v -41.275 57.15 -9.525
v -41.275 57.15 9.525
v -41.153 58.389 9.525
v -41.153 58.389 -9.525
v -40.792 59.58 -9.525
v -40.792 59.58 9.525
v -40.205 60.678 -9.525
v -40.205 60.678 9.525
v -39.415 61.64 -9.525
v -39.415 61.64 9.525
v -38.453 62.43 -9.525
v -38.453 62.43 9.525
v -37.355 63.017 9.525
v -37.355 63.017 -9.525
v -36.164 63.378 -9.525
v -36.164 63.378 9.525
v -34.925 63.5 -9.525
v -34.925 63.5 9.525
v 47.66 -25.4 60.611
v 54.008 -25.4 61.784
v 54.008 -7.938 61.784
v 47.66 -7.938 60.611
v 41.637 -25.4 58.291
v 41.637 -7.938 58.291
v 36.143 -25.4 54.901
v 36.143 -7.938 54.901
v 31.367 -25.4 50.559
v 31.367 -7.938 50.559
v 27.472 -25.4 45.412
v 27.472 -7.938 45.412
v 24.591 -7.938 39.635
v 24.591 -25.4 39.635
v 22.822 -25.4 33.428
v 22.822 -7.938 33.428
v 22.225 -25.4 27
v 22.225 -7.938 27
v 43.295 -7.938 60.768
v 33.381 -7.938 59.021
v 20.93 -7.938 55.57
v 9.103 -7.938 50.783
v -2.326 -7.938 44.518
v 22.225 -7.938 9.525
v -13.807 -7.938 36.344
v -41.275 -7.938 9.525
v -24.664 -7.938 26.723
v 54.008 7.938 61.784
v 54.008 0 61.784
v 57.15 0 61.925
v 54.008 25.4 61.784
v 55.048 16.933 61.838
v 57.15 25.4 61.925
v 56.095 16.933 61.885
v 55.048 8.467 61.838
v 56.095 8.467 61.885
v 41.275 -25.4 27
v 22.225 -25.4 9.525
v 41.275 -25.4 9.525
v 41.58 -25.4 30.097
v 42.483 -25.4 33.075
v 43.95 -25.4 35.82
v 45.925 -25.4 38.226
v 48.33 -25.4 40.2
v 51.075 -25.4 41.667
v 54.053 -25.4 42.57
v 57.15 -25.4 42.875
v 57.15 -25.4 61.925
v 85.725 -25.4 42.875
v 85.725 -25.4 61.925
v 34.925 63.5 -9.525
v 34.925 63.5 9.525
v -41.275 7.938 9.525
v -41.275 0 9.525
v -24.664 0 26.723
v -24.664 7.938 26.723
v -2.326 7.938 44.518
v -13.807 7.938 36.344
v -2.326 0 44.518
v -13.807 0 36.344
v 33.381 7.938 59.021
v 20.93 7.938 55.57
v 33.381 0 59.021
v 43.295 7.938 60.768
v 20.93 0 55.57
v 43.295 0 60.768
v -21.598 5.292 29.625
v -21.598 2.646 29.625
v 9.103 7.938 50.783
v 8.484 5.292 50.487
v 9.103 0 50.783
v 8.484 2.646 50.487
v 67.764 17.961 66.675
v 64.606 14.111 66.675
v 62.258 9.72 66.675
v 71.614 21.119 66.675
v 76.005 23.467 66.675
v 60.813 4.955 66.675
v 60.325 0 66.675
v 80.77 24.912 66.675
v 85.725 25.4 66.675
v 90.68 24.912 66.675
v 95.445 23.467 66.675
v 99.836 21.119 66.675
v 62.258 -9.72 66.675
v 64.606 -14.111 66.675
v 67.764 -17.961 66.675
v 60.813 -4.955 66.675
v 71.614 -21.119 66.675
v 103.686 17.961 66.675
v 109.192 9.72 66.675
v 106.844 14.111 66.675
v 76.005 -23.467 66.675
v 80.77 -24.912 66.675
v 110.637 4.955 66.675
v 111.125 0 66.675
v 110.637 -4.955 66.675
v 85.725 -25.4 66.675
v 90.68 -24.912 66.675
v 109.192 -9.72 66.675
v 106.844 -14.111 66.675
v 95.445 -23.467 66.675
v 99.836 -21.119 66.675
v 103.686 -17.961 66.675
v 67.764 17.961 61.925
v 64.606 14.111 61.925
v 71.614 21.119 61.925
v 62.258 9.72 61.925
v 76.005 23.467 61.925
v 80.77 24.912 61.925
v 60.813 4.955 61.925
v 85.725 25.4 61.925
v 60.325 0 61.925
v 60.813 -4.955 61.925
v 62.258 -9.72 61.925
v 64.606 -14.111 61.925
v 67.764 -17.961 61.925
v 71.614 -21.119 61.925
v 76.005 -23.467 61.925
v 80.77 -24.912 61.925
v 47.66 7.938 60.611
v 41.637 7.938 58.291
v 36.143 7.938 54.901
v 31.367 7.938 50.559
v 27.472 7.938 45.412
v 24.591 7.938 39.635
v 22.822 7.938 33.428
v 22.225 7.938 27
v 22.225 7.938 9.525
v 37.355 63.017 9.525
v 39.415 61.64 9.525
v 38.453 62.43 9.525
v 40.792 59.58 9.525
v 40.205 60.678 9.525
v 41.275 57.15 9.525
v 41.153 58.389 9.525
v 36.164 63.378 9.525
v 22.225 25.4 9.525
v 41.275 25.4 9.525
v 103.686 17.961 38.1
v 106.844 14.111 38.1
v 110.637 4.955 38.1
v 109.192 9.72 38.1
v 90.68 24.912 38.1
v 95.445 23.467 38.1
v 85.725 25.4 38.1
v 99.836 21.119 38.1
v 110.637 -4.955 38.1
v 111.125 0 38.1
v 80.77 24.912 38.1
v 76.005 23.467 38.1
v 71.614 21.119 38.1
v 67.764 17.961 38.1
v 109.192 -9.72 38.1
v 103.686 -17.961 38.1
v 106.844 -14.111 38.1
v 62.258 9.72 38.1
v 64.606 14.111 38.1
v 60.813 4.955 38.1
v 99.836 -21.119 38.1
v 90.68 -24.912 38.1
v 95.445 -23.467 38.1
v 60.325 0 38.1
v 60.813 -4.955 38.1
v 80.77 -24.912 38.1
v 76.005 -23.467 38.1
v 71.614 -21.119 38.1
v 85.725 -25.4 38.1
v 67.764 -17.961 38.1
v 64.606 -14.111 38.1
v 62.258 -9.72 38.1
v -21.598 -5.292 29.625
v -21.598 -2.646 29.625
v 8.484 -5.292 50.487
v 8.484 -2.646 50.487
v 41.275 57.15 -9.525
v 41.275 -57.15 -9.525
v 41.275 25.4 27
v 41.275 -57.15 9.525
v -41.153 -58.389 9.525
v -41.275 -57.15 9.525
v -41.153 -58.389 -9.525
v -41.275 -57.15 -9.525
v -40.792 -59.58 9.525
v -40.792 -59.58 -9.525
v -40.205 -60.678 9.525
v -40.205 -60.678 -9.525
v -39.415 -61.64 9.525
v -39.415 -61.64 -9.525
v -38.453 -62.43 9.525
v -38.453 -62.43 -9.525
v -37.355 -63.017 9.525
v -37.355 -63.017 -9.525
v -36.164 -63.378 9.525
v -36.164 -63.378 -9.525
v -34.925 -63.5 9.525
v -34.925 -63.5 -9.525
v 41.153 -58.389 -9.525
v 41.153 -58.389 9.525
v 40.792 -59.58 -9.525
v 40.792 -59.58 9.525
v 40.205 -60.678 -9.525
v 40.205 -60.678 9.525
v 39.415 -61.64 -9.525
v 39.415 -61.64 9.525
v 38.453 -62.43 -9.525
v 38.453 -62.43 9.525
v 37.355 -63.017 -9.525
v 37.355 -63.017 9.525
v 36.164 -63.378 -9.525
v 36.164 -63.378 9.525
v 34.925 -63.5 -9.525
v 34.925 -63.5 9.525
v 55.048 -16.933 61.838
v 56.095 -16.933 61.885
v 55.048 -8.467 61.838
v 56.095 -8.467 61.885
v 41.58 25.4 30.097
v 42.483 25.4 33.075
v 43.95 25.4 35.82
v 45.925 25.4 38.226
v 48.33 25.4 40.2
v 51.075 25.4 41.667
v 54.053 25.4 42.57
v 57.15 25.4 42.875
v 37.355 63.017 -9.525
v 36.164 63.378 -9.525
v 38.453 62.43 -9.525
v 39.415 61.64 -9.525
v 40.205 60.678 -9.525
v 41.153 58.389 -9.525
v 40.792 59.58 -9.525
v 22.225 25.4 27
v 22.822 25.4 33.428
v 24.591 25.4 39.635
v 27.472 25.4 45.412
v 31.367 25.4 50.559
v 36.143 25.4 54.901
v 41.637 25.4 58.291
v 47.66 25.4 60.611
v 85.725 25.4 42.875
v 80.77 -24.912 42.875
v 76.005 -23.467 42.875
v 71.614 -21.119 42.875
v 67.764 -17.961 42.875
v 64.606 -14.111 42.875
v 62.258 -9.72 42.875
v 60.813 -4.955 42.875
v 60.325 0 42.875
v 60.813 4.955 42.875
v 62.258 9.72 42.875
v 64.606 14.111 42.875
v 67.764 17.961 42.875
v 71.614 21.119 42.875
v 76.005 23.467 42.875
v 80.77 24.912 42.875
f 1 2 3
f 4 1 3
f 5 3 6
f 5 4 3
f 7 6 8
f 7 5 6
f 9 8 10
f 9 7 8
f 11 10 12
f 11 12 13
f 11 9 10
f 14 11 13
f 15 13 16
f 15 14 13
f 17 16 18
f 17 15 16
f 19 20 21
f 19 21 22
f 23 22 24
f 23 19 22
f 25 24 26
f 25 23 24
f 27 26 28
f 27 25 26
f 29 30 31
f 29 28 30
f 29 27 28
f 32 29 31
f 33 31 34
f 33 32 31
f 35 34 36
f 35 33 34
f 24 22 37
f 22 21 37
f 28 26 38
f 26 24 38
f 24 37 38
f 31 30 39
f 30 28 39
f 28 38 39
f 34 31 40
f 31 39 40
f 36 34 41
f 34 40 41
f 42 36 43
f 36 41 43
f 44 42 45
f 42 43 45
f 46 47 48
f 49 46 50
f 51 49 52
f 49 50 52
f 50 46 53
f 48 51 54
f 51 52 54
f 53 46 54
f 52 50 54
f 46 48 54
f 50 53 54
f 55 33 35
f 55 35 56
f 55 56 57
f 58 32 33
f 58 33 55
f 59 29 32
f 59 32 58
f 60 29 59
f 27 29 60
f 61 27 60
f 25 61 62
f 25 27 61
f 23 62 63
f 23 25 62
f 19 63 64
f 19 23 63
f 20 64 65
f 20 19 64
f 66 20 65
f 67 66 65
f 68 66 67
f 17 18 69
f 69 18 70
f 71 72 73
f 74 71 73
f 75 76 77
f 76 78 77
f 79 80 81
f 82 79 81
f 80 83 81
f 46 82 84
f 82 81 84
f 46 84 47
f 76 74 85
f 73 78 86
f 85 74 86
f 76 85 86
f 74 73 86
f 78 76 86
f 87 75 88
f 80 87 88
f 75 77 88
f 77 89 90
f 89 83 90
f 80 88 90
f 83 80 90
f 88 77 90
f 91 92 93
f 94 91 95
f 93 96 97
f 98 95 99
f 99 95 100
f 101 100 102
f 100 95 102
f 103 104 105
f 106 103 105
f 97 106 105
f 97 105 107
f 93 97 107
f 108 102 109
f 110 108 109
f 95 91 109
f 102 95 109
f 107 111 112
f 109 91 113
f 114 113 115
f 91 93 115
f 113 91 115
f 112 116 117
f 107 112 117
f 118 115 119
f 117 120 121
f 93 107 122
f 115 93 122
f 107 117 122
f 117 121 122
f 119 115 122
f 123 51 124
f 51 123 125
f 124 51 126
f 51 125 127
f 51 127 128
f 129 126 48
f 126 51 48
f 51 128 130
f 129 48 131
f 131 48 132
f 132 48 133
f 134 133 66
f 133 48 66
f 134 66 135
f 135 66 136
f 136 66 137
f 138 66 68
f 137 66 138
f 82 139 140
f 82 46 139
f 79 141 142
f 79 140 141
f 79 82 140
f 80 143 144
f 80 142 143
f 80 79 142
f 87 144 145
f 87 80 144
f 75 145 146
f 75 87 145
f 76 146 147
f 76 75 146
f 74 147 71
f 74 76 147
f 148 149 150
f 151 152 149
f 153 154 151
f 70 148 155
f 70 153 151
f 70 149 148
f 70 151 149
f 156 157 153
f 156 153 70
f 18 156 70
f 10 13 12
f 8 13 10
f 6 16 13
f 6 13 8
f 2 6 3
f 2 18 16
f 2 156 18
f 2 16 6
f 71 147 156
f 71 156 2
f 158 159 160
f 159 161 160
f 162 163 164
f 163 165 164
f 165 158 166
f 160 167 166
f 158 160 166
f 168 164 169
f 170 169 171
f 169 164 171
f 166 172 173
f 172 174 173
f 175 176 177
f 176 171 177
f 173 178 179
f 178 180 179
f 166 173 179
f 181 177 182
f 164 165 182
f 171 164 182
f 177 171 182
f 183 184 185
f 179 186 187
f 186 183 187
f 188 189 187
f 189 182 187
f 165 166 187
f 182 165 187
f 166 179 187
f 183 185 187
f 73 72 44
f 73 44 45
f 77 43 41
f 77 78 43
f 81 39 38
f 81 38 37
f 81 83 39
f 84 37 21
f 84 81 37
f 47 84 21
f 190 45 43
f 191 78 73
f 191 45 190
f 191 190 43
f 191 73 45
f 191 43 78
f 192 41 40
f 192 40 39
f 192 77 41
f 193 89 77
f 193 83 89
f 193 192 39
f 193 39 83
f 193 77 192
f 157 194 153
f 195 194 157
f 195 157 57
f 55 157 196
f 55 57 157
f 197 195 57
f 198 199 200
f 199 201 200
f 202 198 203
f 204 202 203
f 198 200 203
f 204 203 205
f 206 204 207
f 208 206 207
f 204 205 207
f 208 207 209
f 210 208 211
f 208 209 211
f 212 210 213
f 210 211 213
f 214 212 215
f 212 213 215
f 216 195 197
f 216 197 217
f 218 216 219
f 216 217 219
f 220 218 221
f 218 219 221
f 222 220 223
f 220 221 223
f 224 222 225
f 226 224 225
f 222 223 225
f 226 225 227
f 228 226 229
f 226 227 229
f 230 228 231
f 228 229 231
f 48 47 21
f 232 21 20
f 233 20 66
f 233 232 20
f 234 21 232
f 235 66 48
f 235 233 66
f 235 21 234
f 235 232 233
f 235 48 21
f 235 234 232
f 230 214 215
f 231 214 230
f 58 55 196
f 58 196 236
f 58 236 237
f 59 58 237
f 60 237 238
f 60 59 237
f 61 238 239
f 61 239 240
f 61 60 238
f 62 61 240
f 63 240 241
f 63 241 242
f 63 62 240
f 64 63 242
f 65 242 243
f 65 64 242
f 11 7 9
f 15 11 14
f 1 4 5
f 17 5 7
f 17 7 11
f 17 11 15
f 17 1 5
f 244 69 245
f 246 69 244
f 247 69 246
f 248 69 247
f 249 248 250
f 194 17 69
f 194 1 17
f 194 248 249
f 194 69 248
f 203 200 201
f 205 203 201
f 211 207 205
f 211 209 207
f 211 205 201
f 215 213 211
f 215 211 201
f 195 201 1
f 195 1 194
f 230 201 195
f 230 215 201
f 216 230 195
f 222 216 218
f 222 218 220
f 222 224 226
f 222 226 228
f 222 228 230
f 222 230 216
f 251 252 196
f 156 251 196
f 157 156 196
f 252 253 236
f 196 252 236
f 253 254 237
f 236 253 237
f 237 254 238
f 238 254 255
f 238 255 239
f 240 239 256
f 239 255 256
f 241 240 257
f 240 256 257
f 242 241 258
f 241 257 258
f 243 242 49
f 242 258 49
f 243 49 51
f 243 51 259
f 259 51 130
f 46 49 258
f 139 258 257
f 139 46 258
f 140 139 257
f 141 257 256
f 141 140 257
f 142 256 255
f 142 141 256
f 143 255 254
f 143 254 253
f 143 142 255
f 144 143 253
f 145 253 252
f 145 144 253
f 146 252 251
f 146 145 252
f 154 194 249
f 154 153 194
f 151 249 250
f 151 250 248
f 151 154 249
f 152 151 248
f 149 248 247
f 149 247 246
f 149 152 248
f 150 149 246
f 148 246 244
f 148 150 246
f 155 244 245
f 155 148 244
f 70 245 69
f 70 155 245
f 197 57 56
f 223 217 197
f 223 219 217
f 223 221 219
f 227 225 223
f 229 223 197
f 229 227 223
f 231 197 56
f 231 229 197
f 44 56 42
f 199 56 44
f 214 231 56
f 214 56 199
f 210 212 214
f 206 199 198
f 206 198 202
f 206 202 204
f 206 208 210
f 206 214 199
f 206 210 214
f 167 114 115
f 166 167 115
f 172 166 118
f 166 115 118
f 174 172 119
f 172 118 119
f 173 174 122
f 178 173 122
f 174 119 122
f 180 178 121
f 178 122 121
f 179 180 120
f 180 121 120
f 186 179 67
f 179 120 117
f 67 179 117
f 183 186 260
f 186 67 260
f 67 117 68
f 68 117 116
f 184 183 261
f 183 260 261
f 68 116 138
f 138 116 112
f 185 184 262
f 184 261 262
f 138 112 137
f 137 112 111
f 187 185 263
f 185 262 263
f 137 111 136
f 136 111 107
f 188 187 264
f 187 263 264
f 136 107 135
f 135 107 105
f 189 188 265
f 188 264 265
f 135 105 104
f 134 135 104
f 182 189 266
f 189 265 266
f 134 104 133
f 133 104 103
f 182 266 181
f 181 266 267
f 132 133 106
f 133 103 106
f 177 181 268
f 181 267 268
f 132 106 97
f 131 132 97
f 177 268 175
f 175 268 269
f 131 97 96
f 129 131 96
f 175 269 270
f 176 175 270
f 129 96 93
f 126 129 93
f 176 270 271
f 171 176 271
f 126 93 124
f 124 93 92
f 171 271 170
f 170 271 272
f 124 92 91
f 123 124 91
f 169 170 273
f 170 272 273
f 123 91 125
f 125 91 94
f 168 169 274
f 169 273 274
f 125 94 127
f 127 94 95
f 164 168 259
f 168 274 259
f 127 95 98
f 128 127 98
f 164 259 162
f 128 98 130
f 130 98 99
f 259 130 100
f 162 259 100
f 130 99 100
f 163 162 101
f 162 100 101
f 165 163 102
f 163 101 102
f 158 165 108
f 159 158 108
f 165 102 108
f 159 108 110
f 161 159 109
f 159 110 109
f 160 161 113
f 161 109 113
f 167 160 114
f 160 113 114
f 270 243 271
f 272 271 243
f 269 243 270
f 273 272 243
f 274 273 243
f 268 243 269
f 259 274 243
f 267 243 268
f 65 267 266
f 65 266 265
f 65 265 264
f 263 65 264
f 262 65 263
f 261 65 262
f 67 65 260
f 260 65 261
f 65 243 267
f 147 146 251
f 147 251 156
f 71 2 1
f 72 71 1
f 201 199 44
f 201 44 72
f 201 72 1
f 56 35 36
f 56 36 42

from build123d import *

# Parameters (mm, degrees)
F1_DEPTH = 63.5
F2_DEPTH = 25.4
F0_W     = 25.4
F0_H     = 19.05
F3_DEPTH = 25.4
F4_DEPTH = 7.9375
F6_R     = 6.35


with BuildPart() as f1:
    # F0 (on Front) → F1 (new body, symmetric)
    with BuildSketch(Plane.XZ):
        Polygon((-41.275, 9.525), (-41.275, -9.525), (41.275, -9.525), (41.275, 9.525), (22.225, 9.525), align=None)
    extrude(amount=F1_DEPTH, both=True)

    # F0 (on Front) → F2 (join, symmetric)
    with BuildSketch(Plane.XZ):
        with BuildLine():
            Line((22.225, 9.525), (41.275, 9.525))
            Line((41.275, 9.525), (41.275, 27.0002))
            ThreePointArc((41.275, 27.0002), (45.9246798487, 38.2255201513), (57.15, 42.8752))
            Line((57.15, 42.8752), (60.325, 42.8752))
            Line((60.325, 42.8752), (60.325, 61.9252))
            Line((60.325, 61.9252), (57.15, 61.9252))
            add(Edge.make_bspline(
                [(54.0079160608, 61.7835715088), (55.0442891577, 61.8415102214), (56.0915997071, 61.8888238055), (57.15, 61.9252)],
                knots=[109.4395067018, 109.4395067018, 109.4395067018, 109.4395067018, 111.5045361635, 111.5045361635, 111.5045361635, 111.5045361635], degree=3))
            ThreePointArc((54.0079160608, 61.7835715088), (31.3673226121, 50.5588326367), (22.225, 27.0002))
            Line((22.225, 27.0002), (22.225, 9.525))
        make_face()
    extrude(amount=F2_DEPTH, both=True)

    # F0 (on Front) → F3 (join, symmetric)
    with BuildSketch(Plane.XZ):
        with Locations((73.025, 52.4002)):
            Rectangle(F0_W, F0_H)
    extrude(amount=F3_DEPTH, both=True)

    # F0 (on Front) → F4 (join, symmetric)
    with BuildSketch(Plane.XZ):
        with BuildLine():
            add(Edge.make_bspline(
                [(-41.275, 9.525), (-25.1212076231, 25.8003253275), (-0.9163175084, 58.7130176756), (54.0079160608, 61.7835715088)],
                knots=[0, 0, 0, 0, 109.4395067018, 109.4395067018, 109.4395067018, 109.4395067018], degree=3))
            Line((-41.275, 9.525), (22.225, 9.525))
            Line((22.225, 9.525), (22.225, 27.0002))
            ThreePointArc((22.225, 27.0002), (31.3673226121, 50.5588326367), (54.0079160608, 61.7835715088))
        make_face()
    extrude(amount=F4_DEPTH, both=True)

    # F0 (on Front) → F5 (revolve)
    with BuildSketch(Plane.XZ):
        Polygon((85.725, 66.675), (85.725, 61.9252), (85.725, 42.8752), (85.725, 38.1), (111.125, 38.1), (111.125, 66.675), align=None)
    revolve(axis=Axis((85.725, 0, 52.3875), (0, 0, -1)))

    # F6
    f6_edges = [f1.edges().sort_by_distance(p)[0] for p in [
        (41.275, -63.5, 0),
        (-41.275, -63.5, 0),
        (41.275, 63.5, 0),
        (-41.275, 63.5, 0),
    ]]
    fillet(f6_edges, radius=F6_R)


solid = f1.part
